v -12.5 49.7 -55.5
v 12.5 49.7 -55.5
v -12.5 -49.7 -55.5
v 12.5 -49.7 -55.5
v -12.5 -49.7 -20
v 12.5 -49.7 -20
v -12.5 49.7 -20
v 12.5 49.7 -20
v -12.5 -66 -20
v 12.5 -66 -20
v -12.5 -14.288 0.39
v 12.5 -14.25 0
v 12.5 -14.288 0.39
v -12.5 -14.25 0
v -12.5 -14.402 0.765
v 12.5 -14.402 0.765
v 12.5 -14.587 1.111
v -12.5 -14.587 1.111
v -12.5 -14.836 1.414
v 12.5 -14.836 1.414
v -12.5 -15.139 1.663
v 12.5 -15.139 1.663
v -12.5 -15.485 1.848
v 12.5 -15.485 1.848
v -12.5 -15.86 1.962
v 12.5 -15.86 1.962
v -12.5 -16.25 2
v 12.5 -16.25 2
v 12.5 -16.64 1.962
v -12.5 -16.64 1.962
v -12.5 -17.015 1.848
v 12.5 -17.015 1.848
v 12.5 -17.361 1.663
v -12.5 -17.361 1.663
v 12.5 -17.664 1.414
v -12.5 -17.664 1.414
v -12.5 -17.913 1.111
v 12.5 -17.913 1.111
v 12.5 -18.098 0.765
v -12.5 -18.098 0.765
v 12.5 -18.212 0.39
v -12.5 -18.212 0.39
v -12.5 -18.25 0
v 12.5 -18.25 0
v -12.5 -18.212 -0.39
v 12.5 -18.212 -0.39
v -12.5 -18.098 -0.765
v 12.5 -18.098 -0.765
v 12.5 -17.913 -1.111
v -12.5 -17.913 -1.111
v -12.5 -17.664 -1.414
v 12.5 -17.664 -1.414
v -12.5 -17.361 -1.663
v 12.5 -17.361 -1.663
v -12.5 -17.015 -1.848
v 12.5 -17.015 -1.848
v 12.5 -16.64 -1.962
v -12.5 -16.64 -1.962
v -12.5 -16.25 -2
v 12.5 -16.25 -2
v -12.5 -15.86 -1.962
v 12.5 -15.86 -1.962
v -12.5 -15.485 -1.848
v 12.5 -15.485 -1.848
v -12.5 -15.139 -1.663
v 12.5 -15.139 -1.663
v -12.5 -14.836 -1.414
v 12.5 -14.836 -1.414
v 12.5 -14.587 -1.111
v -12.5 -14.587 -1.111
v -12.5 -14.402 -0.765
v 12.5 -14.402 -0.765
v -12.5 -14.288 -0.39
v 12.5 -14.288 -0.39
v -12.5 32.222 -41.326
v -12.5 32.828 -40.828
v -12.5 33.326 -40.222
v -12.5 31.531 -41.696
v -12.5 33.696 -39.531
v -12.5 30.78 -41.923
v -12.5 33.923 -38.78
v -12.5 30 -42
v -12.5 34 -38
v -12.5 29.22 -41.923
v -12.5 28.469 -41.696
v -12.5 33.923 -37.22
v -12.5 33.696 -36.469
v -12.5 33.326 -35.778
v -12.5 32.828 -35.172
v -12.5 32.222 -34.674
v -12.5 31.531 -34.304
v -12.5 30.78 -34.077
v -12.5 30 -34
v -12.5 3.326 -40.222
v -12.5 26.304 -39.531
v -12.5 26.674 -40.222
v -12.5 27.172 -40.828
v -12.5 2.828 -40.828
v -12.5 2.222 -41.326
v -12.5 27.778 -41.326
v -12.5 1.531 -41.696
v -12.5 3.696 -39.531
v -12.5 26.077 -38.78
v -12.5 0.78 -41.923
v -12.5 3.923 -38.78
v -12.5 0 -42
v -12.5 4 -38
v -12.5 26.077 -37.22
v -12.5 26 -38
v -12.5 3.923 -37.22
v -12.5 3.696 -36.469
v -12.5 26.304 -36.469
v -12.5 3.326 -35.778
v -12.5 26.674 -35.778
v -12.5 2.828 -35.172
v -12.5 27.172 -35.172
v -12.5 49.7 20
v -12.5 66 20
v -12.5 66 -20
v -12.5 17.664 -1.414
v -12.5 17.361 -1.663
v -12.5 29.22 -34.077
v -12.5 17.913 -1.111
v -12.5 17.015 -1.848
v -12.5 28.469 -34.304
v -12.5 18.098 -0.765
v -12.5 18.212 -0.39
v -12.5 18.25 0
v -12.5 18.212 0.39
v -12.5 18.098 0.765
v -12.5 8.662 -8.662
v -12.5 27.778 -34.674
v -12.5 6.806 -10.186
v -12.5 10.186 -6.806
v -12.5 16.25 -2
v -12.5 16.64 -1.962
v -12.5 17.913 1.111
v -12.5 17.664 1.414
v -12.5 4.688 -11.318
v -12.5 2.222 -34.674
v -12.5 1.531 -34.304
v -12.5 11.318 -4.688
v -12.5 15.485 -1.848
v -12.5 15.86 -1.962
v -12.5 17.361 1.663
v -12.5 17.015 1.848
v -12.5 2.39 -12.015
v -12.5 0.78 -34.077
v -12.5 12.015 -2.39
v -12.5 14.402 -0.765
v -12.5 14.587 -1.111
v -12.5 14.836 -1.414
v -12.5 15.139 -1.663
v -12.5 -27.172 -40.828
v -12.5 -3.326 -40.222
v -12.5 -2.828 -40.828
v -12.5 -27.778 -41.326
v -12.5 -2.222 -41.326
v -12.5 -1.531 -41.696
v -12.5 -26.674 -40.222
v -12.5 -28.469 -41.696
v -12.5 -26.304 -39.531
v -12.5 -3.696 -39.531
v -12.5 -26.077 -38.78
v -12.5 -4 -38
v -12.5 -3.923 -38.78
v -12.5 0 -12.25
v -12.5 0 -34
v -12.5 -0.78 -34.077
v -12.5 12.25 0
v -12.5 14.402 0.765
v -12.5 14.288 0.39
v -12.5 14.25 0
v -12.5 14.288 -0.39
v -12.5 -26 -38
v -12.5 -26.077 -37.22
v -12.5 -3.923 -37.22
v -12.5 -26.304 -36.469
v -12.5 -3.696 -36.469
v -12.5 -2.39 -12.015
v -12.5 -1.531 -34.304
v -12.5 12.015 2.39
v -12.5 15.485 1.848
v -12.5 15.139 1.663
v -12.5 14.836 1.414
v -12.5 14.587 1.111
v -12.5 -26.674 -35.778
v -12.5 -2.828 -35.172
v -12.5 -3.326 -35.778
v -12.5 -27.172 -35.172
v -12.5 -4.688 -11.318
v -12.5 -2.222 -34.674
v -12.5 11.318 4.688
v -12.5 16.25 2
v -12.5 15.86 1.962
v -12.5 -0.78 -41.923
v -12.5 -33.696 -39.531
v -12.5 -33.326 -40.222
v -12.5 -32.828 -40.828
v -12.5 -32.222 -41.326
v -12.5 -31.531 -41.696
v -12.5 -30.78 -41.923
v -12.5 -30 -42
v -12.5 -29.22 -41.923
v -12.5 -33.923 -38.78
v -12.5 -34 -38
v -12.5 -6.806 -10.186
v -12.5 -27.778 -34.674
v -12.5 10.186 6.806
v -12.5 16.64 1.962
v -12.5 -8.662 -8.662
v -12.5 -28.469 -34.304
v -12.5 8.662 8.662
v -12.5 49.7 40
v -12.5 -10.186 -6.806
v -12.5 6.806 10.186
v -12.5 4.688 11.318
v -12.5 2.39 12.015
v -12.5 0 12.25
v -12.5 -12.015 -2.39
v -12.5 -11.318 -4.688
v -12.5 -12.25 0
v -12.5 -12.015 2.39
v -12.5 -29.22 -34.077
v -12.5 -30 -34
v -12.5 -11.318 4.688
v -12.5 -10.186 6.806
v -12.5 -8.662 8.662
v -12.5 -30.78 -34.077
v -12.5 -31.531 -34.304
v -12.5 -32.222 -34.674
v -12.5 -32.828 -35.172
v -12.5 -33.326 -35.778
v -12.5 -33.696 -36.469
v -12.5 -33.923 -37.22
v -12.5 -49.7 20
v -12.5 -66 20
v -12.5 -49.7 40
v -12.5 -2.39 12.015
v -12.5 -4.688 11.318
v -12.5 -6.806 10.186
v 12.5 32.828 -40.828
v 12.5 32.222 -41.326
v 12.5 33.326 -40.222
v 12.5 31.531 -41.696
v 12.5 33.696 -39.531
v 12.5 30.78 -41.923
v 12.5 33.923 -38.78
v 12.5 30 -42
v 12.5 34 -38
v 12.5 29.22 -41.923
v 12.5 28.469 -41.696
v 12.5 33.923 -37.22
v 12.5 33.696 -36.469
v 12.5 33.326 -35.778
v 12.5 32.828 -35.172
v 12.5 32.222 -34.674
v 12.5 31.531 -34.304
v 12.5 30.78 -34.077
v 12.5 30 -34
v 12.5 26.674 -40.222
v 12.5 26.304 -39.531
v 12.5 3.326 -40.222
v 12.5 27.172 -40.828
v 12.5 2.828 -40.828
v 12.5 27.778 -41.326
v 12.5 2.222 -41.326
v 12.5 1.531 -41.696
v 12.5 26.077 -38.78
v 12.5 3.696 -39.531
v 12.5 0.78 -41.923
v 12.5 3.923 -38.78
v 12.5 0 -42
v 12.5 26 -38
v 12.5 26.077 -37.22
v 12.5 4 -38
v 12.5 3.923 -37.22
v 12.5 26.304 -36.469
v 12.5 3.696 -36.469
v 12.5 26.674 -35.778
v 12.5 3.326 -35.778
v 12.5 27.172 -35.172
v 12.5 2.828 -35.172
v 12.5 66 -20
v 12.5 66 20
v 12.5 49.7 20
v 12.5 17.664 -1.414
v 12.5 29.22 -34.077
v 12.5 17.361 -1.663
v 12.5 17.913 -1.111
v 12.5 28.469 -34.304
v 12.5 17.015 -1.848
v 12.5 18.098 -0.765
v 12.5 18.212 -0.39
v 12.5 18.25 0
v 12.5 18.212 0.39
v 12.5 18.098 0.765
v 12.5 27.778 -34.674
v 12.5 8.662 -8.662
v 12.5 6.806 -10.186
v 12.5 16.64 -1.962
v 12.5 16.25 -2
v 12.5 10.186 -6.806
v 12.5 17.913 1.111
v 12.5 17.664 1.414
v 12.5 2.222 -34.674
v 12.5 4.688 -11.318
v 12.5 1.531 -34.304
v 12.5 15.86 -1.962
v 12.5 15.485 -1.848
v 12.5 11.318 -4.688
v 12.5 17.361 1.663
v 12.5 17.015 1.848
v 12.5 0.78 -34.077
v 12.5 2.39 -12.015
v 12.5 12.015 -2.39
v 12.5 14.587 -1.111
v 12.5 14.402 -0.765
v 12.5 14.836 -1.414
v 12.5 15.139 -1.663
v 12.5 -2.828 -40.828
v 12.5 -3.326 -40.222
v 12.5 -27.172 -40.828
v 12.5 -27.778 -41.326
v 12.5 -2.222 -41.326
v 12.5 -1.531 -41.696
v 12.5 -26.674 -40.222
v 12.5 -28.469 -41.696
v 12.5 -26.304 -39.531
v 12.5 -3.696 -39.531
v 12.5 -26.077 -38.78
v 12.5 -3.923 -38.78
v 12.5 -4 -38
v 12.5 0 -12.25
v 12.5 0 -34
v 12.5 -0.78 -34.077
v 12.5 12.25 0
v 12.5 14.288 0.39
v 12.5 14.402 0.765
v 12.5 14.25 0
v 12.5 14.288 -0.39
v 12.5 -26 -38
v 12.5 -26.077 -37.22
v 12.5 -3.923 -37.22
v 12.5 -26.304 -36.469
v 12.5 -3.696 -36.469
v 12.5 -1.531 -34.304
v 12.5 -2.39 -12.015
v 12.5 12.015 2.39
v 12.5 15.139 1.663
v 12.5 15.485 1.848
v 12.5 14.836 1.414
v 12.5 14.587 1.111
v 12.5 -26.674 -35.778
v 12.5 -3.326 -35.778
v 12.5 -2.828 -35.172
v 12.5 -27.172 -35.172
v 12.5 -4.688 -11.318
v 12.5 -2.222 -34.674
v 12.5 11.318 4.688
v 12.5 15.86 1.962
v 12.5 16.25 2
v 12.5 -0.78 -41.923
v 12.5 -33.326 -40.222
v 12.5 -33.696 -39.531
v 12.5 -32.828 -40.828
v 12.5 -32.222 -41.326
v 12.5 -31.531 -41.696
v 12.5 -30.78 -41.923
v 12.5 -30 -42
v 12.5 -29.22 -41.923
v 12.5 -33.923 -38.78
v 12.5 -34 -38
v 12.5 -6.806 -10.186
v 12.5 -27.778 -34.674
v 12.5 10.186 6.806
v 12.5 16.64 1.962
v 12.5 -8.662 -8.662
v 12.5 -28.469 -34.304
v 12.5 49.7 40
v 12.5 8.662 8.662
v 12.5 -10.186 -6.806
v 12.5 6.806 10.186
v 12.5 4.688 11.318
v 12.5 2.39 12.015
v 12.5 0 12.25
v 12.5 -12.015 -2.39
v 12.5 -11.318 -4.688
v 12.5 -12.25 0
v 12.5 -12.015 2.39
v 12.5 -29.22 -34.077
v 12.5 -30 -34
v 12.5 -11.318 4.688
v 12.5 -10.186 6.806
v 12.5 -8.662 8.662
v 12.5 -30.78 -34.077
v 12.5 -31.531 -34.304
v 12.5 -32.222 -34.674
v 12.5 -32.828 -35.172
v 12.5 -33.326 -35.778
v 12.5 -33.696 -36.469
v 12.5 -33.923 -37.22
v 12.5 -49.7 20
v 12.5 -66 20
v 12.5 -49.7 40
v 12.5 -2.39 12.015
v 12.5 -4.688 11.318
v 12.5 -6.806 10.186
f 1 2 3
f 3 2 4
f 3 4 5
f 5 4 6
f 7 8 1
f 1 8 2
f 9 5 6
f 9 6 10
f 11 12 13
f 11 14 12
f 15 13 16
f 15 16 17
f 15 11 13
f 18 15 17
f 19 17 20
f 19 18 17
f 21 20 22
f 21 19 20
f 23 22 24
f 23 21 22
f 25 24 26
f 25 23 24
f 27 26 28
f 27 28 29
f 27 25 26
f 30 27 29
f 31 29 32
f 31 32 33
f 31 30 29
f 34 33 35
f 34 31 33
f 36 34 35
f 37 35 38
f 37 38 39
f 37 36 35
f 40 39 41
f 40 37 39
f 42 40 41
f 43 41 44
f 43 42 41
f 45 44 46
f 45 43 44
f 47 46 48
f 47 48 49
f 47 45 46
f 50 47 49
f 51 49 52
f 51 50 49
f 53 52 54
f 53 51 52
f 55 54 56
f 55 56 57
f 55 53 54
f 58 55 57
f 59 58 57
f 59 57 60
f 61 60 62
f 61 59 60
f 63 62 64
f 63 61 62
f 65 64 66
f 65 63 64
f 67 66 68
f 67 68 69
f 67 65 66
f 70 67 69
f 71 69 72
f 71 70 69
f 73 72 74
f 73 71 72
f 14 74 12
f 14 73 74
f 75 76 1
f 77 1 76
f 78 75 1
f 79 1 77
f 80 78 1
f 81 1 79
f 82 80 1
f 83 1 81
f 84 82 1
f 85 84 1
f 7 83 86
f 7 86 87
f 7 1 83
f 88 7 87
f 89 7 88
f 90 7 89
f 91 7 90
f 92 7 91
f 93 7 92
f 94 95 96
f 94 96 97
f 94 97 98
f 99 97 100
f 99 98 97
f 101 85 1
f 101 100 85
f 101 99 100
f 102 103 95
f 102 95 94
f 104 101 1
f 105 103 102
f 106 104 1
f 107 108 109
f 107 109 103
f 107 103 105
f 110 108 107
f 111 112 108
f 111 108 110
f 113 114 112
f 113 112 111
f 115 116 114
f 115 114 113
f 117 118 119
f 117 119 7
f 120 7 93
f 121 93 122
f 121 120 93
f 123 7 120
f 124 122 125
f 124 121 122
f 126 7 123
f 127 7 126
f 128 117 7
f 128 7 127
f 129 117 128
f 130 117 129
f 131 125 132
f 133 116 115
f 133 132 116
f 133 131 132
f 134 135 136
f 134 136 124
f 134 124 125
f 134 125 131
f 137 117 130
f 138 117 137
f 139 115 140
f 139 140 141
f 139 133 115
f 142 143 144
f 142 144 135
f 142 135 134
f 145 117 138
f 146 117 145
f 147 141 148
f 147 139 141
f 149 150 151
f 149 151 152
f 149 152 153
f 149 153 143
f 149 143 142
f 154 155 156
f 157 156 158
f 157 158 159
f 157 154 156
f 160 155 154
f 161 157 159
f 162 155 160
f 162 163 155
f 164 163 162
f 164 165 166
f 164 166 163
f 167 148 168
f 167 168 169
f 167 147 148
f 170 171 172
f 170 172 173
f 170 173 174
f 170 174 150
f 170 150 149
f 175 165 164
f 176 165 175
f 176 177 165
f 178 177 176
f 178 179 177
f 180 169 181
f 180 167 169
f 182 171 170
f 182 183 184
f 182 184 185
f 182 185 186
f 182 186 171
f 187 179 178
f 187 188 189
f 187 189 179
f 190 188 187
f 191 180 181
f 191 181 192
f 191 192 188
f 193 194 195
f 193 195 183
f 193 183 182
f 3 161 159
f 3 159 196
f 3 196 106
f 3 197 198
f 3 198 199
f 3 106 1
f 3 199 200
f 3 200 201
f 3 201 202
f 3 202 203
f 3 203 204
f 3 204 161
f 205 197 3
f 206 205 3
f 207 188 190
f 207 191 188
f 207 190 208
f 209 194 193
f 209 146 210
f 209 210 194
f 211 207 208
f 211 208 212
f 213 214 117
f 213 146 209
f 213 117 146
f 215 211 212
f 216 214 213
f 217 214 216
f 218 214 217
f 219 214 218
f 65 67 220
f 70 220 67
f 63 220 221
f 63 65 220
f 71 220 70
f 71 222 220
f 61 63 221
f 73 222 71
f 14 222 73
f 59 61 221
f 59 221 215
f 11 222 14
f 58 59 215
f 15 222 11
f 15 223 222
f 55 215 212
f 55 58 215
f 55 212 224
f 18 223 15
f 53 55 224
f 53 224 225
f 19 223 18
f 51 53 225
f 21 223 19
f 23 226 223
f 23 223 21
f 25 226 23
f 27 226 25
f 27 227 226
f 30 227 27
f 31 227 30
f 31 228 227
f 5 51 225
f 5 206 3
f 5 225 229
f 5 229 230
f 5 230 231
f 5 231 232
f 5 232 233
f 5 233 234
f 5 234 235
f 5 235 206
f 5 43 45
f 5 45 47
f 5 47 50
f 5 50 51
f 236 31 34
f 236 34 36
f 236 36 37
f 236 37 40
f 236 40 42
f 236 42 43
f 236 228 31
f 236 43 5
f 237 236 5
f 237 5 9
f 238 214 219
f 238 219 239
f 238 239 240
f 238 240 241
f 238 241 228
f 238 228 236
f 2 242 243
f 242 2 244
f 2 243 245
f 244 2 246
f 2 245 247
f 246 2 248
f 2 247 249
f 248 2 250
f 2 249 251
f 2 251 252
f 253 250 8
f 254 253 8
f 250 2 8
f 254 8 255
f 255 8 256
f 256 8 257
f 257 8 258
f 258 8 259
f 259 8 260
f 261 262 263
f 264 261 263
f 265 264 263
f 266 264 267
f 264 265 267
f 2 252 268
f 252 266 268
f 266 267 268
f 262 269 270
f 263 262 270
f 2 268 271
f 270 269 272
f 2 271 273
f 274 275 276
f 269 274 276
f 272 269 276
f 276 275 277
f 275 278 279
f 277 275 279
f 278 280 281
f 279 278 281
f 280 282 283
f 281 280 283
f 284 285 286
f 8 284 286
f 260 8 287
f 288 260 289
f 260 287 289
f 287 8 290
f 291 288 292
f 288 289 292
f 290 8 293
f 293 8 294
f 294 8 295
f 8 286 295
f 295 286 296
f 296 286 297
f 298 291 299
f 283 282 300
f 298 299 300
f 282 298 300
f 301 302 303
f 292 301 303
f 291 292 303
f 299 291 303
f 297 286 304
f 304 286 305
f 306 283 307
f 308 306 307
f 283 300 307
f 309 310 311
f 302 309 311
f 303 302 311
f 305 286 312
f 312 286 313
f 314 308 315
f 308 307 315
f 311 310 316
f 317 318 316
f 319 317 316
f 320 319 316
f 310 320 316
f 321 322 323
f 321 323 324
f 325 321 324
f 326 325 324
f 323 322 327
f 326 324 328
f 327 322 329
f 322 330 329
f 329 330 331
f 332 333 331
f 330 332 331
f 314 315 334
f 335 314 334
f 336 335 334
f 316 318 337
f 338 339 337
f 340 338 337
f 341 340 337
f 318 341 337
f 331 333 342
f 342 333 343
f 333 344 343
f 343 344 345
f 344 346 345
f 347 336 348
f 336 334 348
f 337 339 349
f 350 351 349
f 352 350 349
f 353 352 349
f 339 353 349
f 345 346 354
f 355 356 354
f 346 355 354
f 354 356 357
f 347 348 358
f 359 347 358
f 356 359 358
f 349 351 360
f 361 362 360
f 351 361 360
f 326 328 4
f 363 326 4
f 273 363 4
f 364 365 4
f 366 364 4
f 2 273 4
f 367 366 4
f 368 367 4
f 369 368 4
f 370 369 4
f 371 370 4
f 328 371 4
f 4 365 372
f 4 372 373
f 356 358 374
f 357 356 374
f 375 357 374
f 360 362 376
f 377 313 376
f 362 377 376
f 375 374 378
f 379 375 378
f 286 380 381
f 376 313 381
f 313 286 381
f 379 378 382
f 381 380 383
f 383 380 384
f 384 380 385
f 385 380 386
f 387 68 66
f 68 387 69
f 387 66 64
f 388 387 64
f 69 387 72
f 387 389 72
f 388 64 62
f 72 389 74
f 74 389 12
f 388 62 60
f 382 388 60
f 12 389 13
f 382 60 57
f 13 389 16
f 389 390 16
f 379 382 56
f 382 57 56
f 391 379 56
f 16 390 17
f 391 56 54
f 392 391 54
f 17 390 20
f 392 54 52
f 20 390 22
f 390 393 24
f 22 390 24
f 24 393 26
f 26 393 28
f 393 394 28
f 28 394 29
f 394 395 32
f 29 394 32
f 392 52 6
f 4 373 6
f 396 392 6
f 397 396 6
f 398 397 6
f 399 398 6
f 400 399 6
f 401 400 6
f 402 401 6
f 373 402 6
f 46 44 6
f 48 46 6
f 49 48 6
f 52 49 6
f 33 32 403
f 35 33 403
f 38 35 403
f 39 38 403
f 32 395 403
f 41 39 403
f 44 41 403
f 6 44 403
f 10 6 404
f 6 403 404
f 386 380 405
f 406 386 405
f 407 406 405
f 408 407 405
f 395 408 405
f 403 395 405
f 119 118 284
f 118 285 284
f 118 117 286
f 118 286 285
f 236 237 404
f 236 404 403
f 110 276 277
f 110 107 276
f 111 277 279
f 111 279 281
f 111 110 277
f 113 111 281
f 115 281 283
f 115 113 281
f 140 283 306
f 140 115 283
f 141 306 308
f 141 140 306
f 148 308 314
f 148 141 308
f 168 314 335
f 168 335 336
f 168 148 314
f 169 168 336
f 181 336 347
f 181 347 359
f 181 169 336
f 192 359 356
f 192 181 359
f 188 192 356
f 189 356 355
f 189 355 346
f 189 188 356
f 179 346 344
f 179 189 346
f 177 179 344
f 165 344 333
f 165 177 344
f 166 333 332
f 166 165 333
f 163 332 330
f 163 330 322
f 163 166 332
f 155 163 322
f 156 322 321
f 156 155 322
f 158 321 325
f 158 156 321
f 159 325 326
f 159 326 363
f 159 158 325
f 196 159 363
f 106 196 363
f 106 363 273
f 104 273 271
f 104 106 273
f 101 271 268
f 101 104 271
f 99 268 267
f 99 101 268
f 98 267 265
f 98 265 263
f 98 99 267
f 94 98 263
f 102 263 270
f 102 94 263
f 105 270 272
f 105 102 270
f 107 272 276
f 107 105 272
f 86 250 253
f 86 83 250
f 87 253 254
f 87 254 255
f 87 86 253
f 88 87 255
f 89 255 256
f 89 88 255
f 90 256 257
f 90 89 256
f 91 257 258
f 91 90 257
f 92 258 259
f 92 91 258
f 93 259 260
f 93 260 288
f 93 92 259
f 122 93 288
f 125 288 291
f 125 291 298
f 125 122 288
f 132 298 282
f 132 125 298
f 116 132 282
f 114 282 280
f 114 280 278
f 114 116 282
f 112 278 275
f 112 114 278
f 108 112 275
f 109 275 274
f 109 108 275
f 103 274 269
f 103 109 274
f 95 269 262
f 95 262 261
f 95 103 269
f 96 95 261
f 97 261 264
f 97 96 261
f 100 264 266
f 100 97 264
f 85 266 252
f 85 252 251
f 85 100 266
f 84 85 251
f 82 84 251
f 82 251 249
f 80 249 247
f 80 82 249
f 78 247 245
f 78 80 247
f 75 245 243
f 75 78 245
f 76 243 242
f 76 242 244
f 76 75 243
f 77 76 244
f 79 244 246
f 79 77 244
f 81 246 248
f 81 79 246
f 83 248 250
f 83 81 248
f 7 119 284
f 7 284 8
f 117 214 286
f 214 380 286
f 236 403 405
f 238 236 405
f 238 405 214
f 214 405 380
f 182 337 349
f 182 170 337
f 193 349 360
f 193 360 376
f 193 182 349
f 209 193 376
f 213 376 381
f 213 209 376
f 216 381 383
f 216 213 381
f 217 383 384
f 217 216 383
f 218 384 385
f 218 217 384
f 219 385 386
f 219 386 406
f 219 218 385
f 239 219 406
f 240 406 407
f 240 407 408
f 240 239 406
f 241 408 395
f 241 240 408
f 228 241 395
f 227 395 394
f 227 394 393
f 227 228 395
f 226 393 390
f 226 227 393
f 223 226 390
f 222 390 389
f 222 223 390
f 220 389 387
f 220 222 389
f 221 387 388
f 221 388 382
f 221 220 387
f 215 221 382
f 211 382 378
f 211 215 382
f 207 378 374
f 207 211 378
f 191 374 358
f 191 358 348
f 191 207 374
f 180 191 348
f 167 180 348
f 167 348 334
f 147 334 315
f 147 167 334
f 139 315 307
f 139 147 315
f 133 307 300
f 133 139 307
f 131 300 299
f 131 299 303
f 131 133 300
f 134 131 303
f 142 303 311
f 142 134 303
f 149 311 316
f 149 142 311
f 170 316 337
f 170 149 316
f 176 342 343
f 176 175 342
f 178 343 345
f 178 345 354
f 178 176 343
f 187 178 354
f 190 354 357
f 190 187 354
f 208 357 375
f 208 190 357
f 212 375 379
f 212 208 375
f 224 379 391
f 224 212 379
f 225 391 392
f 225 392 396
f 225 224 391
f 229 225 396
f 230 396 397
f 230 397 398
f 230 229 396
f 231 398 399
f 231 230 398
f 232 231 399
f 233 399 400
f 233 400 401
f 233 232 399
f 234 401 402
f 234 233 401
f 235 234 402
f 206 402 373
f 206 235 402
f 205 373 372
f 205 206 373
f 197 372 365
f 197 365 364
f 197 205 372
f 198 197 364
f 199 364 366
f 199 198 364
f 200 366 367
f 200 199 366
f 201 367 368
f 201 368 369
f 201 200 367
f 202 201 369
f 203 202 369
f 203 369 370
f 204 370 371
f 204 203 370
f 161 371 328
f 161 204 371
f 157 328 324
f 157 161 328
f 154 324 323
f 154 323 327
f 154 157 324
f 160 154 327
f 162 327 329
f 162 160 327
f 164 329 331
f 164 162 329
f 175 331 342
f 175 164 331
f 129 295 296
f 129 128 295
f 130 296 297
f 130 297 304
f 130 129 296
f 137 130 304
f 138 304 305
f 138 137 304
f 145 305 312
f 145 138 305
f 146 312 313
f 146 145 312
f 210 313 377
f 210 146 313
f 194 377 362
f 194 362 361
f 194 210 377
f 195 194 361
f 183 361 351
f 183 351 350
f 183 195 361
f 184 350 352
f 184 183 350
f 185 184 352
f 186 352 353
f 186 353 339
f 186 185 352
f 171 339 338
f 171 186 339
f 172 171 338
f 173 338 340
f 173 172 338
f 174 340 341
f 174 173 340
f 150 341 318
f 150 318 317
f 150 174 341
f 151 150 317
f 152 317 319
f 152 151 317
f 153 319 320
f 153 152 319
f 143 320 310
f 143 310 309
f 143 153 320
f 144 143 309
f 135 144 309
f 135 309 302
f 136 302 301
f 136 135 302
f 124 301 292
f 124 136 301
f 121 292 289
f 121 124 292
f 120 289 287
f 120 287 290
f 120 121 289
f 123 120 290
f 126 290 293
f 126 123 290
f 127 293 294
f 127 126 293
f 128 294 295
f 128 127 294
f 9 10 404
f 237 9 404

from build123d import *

# Parameters (mm, degrees)
SKETCH_R      = 12.25
SKETCH_R_2    = 2
SKETCH_R_3    = 4
PAD_DEPTH     = 12.5
SKETCH001_W   = 8
SKETCH001_H   = 40
PAD001_DEPTH  = 12.5
SKETCH002_W   = 8
SKETCH002_H   = 40
PAD002_DEPTH  = 12.5
SKETCH003_R   = 20.25
SKETCH003_R_2 = 12.25
SKETCH003_R_3 = 2
PAD003_DEPTH  = 12.5


with BuildPart() as part:
    # Sketch → Pad (new body, symmetric)
    with BuildSketch(Plane.YZ):
        Polygon((-49.7, 40), (49.7, 40), (49.7, 20), (66, 20), (66, -20), (49.7, -20), (49.7, -55.5), (-49.7, -55.5), (-49.7, -20), (-66, -20), (-66, 20), (-49.7, 20), align=None)
        Circle(SKETCH_R, mode=Mode.SUBTRACT)
        with Locations((-16.25, 0)):
            Circle(SKETCH_R_2, mode=Mode.SUBTRACT)
        with Locations((16.25, 0)):
            Circle(SKETCH_R_2, mode=Mode.SUBTRACT)
        with Locations((0, -38)):
            Circle(SKETCH_R_3, mode=Mode.SUBTRACT)
        with Locations((-30, -38)):
            Circle(SKETCH_R_3, mode=Mode.SUBTRACT)
        with Locations((30, -38)):
            Circle(SKETCH_R_3, mode=Mode.SUBTRACT)
    extrude(amount=PAD_DEPTH, both=True)

    # Sketch001 → Pad001 (join, symmetric)
    with BuildSketch(Plane.YZ):
        with Locations((-54, 0)):
            Rectangle(SKETCH001_W, SKETCH001_H)
    extrude(amount=PAD001_DEPTH, both=True)

    # Sketch002 → Pad002 (join, symmetric)
    with BuildSketch(Plane.YZ):
        with Locations((54, 0)):
            Rectangle(SKETCH002_W, SKETCH002_H)
    extrude(amount=PAD002_DEPTH, both=True)

    # Sketch003 → Pad003 (join, symmetric)
    with BuildSketch(Plane.YZ):
        Circle(SKETCH003_R)
        Circle(SKETCH003_R_2, mode=Mode.SUBTRACT)
        with Locations((-16.25, 0)):
            Circle(SKETCH003_R_3, mode=Mode.SUBTRACT)
        with Locations((16.25, 0)):
            Circle(SKETCH003_R_3, mode=Mode.SUBTRACT)
    extrude(amount=PAD003_DEPTH, both=True)


solid = part.part
